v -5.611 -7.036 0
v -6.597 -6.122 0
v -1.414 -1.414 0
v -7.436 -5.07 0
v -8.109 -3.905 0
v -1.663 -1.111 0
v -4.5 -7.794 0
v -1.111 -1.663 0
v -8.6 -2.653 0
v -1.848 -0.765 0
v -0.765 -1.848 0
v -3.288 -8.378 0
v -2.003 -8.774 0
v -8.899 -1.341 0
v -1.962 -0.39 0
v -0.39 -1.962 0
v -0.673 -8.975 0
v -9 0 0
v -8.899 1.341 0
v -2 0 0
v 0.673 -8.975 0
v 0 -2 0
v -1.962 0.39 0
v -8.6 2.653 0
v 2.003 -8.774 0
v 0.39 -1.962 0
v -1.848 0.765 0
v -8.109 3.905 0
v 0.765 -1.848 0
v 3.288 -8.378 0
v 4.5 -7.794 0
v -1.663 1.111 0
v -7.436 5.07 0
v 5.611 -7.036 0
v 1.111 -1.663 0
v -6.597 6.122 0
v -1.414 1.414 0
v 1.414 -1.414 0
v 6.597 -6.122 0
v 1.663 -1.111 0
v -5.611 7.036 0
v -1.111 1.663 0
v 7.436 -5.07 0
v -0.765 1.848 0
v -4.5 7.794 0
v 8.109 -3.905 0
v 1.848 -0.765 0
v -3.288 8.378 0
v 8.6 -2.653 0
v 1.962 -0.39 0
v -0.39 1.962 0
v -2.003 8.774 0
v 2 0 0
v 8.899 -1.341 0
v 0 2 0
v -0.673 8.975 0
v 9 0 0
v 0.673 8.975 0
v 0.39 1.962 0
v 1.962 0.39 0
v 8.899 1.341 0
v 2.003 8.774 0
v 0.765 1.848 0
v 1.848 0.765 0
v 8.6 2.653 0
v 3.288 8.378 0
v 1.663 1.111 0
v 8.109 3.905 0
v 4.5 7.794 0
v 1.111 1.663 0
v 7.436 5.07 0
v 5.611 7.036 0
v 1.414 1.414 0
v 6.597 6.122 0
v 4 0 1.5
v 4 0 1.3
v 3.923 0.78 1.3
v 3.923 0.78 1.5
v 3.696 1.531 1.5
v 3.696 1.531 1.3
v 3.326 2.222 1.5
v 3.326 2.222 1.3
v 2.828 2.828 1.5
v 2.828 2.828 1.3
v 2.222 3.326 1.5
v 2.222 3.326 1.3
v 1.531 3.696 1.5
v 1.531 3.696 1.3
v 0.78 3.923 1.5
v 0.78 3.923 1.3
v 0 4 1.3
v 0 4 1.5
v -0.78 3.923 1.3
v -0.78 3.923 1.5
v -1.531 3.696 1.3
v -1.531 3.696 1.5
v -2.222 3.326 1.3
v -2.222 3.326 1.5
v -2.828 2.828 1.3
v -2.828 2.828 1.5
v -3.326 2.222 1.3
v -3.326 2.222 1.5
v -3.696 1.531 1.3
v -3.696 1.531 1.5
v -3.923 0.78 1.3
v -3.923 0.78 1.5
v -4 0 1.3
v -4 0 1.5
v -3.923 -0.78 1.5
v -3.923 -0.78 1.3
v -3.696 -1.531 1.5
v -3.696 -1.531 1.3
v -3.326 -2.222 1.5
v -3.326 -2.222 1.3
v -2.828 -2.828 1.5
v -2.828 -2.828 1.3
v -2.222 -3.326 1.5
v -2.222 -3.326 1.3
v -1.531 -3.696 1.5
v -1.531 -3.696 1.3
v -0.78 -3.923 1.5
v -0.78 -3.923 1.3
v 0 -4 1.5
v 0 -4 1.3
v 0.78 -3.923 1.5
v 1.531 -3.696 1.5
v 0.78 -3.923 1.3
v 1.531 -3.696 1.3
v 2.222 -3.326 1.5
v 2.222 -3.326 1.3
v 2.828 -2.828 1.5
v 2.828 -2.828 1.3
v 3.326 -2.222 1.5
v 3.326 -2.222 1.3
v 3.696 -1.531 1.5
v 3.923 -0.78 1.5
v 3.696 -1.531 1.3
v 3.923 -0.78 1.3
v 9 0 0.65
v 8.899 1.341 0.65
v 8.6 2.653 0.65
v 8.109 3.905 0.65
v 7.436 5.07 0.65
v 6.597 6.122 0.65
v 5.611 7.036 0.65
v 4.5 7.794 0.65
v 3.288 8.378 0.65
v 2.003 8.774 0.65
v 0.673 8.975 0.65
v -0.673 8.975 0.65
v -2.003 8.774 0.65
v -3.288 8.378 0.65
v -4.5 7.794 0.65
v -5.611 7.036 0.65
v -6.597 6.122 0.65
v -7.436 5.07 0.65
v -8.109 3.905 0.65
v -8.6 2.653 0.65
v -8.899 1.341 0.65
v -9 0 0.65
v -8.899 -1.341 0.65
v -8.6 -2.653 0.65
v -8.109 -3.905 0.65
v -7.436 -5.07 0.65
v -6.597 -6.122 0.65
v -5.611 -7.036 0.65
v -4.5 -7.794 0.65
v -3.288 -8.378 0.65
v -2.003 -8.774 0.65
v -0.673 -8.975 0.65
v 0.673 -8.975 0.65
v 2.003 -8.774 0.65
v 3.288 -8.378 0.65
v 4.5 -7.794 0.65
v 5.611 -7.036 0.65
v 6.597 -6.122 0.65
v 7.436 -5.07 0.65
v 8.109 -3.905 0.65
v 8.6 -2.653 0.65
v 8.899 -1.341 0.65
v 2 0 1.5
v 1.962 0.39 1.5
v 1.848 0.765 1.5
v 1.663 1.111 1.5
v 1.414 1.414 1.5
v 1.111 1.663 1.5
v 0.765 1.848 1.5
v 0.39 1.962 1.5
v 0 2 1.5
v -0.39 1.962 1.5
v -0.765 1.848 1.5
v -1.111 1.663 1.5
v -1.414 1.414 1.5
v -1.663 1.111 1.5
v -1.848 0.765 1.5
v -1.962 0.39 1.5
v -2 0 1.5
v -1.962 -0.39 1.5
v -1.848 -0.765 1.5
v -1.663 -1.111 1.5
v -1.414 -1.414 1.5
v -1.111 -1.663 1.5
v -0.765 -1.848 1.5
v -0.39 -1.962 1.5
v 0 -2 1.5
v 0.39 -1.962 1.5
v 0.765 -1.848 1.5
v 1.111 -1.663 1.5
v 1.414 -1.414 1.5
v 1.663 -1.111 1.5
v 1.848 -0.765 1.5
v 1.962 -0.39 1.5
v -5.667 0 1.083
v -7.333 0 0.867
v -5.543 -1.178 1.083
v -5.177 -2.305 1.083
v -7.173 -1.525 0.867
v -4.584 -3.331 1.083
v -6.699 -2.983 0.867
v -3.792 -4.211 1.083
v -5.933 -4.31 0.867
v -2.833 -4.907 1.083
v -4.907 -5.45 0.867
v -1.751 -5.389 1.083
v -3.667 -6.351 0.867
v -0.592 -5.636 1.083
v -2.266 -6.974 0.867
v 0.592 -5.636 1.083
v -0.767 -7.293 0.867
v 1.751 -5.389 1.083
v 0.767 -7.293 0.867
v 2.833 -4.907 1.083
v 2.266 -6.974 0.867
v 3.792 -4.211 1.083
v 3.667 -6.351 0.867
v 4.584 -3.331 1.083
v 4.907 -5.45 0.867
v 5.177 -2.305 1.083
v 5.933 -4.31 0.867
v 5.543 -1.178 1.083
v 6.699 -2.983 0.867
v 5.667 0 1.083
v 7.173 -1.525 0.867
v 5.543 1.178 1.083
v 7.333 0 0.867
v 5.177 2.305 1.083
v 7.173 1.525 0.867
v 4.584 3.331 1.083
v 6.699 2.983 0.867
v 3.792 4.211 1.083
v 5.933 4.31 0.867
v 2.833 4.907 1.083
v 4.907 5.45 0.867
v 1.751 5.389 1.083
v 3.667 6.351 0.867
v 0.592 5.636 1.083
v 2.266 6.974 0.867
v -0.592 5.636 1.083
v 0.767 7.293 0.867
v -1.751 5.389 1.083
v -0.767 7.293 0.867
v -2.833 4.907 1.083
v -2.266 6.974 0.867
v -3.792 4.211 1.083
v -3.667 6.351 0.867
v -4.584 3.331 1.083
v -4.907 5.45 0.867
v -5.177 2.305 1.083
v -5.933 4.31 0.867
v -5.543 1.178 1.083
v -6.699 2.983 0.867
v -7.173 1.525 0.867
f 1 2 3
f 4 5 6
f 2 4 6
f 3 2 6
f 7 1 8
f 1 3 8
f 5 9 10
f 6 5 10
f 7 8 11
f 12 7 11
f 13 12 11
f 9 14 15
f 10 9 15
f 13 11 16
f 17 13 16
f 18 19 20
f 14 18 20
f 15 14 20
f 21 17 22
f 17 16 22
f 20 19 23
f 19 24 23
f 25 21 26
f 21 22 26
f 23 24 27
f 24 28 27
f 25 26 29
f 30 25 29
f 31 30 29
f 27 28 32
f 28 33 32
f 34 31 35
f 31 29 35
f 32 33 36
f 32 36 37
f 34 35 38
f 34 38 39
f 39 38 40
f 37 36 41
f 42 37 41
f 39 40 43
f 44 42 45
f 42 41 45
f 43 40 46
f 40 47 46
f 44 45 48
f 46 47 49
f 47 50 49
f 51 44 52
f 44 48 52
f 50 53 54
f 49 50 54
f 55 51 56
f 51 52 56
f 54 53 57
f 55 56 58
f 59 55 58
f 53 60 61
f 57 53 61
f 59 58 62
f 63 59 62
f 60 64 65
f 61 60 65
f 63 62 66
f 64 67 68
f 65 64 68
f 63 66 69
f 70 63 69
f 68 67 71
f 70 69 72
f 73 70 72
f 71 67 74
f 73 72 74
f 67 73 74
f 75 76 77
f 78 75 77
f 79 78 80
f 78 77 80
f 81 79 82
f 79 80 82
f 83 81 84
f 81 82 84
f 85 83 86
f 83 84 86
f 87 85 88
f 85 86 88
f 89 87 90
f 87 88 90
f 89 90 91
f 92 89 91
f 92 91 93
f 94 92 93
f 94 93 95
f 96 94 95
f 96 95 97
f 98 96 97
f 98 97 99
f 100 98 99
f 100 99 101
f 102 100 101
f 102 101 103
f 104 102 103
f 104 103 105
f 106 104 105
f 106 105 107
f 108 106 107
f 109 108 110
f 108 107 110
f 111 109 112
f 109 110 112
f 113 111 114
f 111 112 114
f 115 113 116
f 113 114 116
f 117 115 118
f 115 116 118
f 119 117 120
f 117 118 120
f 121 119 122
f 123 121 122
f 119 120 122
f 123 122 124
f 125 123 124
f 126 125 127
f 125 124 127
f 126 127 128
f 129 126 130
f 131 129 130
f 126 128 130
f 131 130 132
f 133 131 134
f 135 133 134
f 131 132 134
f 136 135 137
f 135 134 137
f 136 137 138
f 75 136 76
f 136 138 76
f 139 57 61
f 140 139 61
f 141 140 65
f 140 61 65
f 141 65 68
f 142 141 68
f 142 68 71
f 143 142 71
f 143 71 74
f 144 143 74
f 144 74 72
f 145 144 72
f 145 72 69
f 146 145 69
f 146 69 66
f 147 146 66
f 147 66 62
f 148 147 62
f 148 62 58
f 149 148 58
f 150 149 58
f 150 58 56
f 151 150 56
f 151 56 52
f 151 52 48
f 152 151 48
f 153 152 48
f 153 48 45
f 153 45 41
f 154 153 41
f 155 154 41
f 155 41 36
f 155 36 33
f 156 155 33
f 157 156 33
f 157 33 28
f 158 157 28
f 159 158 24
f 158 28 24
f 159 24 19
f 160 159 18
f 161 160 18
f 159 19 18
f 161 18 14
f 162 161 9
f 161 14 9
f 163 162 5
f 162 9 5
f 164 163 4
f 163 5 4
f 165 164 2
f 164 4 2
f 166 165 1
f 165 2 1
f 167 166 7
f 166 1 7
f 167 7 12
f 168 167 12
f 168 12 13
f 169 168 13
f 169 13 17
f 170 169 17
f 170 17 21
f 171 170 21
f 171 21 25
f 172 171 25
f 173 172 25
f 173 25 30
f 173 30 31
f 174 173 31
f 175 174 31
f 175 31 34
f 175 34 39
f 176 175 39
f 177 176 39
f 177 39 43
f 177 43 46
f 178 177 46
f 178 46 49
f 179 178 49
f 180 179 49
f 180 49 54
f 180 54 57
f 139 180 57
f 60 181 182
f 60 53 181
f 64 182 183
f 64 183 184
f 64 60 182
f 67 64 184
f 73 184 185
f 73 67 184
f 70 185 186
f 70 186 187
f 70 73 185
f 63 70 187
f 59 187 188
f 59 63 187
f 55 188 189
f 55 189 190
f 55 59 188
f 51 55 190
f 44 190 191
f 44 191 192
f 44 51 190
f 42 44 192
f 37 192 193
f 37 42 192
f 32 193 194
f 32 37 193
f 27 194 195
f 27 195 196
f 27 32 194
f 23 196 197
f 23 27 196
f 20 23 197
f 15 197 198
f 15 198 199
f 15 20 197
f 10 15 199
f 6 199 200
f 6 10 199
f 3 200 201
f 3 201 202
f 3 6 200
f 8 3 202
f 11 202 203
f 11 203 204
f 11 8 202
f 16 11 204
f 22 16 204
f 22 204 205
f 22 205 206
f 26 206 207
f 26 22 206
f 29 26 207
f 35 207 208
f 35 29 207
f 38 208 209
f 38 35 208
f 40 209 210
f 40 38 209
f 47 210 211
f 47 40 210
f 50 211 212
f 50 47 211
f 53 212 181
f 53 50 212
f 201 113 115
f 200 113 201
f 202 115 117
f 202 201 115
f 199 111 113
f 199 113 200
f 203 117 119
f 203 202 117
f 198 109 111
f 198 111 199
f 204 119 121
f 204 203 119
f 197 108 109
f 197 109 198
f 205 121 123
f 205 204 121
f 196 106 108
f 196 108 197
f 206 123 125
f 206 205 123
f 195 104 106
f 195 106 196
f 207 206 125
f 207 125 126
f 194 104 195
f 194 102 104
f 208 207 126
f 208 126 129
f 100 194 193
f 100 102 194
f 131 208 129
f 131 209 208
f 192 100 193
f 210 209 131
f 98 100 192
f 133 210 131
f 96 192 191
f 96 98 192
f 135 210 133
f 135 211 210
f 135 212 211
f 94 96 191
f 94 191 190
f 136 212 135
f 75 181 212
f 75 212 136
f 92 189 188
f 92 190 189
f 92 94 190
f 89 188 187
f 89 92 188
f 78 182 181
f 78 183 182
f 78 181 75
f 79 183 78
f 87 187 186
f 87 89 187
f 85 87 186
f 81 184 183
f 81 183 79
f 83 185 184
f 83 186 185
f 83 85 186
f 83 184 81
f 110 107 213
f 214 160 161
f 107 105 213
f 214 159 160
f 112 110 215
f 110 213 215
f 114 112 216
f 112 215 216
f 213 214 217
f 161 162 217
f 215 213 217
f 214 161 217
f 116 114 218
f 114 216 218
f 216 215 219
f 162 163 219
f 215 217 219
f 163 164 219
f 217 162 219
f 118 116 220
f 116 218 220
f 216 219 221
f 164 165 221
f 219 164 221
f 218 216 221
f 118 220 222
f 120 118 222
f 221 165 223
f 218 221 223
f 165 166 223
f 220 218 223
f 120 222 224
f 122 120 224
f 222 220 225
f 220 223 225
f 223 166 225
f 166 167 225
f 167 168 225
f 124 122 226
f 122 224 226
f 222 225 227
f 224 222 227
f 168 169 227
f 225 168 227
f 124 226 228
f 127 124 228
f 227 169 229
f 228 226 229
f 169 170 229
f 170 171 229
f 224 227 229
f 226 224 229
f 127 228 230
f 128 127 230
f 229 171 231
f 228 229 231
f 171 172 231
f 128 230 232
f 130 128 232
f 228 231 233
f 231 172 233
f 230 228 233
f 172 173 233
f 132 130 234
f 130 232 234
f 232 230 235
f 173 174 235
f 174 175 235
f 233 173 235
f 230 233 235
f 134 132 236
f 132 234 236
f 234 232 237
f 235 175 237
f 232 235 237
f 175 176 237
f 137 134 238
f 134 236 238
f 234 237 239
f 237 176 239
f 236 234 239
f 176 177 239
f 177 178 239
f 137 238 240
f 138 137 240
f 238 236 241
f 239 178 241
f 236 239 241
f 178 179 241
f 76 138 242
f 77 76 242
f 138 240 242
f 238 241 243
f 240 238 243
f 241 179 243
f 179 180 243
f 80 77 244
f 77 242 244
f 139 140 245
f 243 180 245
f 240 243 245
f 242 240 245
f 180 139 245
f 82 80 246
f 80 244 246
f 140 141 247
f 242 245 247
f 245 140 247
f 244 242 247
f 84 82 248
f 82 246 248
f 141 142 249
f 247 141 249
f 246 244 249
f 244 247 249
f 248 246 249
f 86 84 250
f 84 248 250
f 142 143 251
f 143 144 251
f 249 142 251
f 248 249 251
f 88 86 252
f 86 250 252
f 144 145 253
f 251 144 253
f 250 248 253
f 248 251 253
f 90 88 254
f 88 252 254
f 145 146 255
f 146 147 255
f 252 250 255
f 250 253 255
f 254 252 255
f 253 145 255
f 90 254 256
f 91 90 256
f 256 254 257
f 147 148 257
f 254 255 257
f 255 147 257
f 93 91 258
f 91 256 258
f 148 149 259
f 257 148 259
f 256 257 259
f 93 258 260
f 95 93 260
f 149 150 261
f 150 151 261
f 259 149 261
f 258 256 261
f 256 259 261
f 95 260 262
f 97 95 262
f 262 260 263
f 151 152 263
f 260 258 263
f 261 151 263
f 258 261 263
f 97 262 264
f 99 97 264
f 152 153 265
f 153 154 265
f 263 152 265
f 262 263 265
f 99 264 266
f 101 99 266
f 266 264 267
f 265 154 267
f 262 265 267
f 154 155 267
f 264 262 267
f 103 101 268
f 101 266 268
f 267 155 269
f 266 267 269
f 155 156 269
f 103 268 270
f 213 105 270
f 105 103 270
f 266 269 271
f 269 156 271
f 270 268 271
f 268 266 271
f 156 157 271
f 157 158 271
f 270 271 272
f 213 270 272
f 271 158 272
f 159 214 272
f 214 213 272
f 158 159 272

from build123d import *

# Parameters (mm, degrees)
SKETCH_1_R      = 9
SKETCH_1_R_2    = 2
EXTRUDE_1_DEPTH = 1.3
SKETCH_2_R      = 4
SKETCH_2_R_2    = 2
EXTRUDE_2_DEPTH = 0.2


with BuildPart() as part:
    # Эскиз1 → Бобышка-Вытянуть1 (new body)
    with BuildSketch(Plane.XY):
        Circle(SKETCH_1_R)
        Circle(SKETCH_1_R_2, mode=Mode.SUBTRACT)
    extrude(amount=EXTRUDE_1_DEPTH)

    # Эскиз2 → Бобышка-Вытянуть2 (add)
    with BuildSketch(Plane.XY.offset(1.3)):
        Circle(SKETCH_2_R)
        Circle(SKETCH_2_R_2, mode=Mode.SUBTRACT)
    extrude(amount=EXTRUDE_2_DEPTH)

    # Эскиз3 → Вырез-Повернуть1 (revolve, cut)
    with BuildSketch(Plane(origin=(0, 0, 0), x_dir=(1, 0, 0), z_dir=(0, 1, 0))):
        Polygon((-4, -1.3), (-9, -0.65), (-9, -1.3), align=None)
    revolve(axis=Axis((0, 0, 0), (0, 0, 1)), mode=Mode.SUBTRACT)


solid = part.part
